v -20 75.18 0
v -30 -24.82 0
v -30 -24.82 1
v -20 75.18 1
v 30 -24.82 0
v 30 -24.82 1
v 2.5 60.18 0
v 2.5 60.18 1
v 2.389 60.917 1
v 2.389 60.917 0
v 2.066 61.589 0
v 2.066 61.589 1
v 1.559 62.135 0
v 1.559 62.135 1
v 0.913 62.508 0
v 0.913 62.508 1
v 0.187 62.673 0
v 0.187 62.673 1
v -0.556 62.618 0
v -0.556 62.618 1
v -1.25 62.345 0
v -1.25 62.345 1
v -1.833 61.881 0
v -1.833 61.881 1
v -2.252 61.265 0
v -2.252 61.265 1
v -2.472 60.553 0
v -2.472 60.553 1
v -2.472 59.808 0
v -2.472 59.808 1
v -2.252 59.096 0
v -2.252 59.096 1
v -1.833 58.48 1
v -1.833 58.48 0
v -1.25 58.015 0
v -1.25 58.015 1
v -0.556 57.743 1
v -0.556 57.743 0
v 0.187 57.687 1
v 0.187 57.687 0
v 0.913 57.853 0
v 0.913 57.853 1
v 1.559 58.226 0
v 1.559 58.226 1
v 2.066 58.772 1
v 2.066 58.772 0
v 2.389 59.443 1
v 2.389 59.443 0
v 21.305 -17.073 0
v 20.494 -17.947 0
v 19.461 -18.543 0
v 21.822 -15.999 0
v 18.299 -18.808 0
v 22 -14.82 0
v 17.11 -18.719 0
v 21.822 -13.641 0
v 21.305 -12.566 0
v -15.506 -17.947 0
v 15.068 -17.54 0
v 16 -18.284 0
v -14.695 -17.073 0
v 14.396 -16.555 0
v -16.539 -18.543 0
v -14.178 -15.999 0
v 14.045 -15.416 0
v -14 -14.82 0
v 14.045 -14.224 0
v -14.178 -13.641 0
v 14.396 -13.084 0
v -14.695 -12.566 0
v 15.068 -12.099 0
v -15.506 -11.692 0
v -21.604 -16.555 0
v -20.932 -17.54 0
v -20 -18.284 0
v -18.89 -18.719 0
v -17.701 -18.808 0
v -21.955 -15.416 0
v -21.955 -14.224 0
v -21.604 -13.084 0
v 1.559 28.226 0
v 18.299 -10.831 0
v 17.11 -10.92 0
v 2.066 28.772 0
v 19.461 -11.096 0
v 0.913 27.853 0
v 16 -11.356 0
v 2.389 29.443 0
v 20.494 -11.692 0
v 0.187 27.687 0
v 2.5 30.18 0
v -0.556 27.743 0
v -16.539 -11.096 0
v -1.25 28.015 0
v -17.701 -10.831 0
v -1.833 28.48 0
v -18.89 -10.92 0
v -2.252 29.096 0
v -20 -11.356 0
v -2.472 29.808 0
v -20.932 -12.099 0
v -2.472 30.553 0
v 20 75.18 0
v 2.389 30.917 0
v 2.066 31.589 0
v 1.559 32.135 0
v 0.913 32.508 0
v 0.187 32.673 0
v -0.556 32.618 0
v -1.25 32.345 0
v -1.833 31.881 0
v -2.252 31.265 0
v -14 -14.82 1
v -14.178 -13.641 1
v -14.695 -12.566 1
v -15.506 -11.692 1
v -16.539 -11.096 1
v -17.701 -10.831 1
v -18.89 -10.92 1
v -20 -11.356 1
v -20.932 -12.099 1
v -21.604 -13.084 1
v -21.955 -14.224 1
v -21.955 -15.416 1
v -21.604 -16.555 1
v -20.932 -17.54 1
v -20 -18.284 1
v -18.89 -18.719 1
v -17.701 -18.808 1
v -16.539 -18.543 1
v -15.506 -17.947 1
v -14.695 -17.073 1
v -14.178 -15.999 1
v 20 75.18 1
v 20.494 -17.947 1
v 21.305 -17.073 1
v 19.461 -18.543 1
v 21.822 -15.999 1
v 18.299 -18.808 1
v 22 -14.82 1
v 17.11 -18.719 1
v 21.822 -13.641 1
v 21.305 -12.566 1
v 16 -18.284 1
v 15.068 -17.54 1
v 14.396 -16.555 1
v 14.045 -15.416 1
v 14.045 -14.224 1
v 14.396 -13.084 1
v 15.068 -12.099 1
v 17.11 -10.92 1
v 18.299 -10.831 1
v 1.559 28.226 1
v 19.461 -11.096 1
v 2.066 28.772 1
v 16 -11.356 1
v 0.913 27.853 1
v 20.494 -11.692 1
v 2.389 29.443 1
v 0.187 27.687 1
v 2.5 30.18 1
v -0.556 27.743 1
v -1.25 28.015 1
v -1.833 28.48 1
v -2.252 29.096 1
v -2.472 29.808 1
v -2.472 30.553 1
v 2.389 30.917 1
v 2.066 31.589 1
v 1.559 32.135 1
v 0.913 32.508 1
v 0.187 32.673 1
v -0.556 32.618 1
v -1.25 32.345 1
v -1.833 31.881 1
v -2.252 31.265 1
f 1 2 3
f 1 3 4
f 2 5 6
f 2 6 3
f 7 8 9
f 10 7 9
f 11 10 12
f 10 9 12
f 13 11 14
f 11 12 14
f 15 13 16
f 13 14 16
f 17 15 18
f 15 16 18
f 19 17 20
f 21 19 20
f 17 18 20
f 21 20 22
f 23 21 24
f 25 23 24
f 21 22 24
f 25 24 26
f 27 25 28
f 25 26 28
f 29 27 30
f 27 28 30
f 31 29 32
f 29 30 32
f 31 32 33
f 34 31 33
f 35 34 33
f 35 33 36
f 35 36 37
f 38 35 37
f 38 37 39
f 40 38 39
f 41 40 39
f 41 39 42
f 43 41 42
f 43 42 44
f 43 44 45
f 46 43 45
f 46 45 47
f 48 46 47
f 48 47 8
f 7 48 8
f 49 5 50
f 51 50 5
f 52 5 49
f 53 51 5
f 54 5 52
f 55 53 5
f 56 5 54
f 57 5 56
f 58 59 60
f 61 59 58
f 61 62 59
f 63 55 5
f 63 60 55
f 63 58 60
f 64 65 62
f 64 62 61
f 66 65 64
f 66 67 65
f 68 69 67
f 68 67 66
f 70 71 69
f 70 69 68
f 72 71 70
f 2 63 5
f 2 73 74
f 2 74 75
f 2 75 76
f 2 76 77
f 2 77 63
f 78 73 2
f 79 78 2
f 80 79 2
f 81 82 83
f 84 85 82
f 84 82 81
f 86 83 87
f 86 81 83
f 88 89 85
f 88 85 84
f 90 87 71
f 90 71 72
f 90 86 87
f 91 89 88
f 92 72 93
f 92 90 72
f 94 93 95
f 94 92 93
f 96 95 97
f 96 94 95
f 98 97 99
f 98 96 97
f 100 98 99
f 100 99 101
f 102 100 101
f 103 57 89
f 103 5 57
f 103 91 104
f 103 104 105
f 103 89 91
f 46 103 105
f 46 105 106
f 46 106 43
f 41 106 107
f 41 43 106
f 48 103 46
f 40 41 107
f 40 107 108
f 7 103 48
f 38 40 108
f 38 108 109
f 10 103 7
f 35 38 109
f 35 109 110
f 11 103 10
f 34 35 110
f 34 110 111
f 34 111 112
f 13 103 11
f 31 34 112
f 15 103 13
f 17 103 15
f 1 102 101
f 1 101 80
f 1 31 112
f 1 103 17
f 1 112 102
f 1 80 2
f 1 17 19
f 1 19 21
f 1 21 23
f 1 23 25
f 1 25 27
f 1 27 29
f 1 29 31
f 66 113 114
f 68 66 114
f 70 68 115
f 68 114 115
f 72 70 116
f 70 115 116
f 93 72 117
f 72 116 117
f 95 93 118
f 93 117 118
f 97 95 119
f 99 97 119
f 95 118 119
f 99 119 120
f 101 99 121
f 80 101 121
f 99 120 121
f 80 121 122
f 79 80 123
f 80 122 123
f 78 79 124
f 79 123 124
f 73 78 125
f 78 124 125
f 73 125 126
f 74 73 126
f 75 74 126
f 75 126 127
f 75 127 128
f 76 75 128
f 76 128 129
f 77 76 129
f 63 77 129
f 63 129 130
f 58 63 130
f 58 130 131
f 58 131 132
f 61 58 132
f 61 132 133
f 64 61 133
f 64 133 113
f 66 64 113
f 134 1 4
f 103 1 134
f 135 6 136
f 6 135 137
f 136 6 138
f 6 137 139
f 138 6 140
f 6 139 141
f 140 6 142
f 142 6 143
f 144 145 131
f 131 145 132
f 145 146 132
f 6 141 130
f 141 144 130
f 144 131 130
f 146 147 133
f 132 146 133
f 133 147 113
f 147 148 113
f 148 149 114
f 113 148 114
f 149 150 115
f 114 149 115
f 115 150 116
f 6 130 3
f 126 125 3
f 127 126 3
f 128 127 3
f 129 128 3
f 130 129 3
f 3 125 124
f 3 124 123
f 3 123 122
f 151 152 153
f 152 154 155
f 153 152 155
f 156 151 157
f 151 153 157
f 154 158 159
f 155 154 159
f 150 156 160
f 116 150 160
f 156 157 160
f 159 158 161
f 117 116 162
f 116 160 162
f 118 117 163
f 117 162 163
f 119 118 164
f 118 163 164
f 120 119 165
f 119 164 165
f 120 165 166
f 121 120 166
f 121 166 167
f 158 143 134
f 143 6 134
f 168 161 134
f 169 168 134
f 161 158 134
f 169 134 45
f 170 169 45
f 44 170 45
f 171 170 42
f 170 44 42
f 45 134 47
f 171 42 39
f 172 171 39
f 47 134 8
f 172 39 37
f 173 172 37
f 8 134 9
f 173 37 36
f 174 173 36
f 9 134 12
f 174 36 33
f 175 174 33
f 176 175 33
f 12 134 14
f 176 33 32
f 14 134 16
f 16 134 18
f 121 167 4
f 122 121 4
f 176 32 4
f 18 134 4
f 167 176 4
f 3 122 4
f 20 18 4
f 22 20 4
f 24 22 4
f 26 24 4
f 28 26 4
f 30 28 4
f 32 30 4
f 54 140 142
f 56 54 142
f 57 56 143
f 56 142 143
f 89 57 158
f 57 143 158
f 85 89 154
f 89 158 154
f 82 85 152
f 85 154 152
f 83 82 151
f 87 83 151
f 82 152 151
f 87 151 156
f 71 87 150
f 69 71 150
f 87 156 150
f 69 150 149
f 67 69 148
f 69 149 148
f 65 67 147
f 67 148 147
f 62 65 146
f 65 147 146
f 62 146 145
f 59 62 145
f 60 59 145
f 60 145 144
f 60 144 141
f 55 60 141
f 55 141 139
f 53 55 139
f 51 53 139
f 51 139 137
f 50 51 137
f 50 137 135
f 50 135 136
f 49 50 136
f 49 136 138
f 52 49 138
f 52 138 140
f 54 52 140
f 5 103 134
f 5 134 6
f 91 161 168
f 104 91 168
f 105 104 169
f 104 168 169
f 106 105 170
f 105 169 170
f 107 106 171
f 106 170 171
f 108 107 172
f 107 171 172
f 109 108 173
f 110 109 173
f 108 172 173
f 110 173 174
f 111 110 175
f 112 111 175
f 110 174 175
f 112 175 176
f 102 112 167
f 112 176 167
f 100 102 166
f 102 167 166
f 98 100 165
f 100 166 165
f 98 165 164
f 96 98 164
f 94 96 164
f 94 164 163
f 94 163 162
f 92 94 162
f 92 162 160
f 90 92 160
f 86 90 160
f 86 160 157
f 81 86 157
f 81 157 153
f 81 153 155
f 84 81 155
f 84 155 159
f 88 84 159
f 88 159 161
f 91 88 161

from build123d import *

# Parameters (mm, degrees)
BOSS_EXTRUDE1_DEPTH = 1
SKETCH3_R           = 4
SKETCH3_R_2         = 2.5
CUT_EXTRUDE1_DEPTH  = 2


with BuildPart() as part:
    # Sketch2 → Boss-Extrude1 (new body)
    with BuildSketch(Plane.XY):
        Polygon((-20, 75.180318298), (20, 75.180318298), (30, -24.819681702), (-30, -24.819681702), align=None)
    extrude(amount=BOSS_EXTRUDE1_DEPTH)

    # Sketch3 → Cut-Extrude1 (cut, through all)
    with BuildSketch(Plane.XY.offset(1)):
        with Locations((18, -14.819681702)):
            Circle(SKETCH3_R)
        with Locations((-18, -14.819681702)):
            Circle(SKETCH3_R)
        with Locations((0, 60.180318298)):
            Circle(SKETCH3_R_2)
        with Locations((0, 30.180318298)):
            Circle(SKETCH3_R_2)
    extrude(amount=-CUT_EXTRUDE1_DEPTH, mode=Mode.SUBTRACT)


solid = part.part
